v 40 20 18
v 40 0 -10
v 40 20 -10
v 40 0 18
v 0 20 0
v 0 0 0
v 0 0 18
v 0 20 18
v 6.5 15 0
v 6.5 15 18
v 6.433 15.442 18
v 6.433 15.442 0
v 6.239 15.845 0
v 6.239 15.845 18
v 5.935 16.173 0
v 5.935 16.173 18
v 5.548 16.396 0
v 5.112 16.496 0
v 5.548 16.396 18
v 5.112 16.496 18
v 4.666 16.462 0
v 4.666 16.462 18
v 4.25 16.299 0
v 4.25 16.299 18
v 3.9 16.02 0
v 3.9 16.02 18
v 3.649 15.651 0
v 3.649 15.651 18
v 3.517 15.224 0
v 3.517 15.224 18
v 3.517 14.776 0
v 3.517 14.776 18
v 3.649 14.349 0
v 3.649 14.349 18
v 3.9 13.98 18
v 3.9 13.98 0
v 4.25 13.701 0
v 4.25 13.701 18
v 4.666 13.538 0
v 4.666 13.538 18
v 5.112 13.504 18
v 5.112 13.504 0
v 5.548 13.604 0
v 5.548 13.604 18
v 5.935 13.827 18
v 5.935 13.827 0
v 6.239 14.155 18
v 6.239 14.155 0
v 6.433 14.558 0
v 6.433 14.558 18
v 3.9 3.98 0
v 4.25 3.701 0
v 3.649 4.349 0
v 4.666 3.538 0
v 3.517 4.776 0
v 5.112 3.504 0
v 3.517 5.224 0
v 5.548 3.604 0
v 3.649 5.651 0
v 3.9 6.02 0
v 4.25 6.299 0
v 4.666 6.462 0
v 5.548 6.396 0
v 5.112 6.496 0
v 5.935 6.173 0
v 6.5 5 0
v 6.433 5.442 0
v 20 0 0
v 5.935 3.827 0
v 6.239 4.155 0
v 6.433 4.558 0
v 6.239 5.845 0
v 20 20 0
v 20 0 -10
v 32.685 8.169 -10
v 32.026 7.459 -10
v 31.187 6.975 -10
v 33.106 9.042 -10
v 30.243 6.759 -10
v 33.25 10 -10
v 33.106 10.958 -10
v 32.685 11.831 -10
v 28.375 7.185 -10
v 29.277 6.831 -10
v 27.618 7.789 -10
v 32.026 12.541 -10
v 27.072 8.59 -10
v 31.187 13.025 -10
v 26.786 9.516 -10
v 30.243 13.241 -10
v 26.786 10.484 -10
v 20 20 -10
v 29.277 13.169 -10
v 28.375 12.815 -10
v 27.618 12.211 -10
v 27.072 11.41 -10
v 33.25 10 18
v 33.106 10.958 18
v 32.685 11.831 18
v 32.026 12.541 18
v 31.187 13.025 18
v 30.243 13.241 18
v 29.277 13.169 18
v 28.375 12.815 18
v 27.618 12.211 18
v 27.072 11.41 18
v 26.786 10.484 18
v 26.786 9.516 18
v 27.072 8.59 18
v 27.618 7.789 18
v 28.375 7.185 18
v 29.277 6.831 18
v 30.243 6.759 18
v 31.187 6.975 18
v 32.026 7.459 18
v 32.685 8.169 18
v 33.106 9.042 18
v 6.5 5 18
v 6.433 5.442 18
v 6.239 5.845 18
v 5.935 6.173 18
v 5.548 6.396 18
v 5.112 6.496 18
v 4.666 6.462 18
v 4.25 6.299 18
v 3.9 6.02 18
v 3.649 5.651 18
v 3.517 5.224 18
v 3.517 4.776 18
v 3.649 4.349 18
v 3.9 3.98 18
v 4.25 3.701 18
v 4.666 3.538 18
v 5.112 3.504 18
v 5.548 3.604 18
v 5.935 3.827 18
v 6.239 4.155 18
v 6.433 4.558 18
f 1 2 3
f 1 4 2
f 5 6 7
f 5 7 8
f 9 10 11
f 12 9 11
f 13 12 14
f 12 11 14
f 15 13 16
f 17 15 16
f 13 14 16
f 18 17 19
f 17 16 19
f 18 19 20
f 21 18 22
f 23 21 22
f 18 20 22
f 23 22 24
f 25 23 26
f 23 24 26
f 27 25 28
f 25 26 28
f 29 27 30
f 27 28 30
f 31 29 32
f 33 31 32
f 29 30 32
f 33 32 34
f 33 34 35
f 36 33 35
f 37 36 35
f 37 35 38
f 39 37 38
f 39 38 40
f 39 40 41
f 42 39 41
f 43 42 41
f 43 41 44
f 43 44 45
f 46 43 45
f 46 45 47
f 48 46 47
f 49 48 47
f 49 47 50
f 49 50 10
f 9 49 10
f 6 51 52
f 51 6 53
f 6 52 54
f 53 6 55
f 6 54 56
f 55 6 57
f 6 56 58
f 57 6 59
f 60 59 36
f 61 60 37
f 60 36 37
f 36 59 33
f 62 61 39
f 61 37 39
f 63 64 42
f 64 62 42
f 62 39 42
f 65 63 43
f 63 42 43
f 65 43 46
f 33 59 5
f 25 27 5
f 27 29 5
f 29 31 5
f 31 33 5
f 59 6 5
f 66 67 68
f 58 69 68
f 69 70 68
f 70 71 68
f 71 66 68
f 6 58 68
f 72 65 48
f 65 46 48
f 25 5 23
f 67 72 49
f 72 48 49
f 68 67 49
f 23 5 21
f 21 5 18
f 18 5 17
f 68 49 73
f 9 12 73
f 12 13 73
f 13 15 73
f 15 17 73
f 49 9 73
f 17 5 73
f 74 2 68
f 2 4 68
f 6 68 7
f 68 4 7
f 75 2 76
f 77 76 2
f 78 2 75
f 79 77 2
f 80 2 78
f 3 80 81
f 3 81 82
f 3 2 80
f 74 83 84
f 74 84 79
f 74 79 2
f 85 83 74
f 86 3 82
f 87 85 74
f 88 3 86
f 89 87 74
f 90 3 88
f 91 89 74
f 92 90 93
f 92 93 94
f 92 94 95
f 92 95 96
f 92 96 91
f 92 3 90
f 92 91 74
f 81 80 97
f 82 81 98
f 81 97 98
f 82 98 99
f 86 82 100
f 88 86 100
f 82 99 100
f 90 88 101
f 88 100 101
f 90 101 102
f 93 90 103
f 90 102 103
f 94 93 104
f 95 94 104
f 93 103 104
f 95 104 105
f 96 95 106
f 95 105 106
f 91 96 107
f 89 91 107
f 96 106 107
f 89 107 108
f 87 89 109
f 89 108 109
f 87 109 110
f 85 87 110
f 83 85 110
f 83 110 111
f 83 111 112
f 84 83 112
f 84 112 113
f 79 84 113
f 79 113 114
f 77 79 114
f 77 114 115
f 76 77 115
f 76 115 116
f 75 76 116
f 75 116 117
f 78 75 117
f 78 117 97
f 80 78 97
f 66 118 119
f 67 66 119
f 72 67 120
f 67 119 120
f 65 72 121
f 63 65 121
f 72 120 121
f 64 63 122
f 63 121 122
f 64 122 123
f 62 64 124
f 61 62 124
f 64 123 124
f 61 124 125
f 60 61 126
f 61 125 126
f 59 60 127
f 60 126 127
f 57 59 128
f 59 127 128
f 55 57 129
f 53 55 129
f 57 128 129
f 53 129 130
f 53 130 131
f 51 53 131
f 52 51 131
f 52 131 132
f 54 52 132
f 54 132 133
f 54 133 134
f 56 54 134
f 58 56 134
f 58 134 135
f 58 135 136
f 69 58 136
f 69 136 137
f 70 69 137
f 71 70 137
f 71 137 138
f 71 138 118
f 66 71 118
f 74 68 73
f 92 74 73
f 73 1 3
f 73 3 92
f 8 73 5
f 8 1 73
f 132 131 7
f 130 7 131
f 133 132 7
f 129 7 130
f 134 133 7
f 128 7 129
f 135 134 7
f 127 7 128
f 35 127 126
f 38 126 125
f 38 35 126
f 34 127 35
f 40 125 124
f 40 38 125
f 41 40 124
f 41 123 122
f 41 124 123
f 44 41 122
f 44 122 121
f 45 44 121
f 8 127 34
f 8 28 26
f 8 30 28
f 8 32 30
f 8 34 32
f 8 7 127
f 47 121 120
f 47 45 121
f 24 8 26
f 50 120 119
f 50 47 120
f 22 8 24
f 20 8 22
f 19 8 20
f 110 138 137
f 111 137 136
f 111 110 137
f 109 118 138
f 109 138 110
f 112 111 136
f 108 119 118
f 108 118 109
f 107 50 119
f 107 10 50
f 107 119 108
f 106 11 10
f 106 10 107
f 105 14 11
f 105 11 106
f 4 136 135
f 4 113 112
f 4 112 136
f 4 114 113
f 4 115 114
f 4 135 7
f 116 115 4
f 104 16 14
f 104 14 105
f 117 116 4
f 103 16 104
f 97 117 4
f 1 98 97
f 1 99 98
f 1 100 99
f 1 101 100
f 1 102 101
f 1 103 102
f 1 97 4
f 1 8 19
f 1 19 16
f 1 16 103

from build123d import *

# Parameters (mm, degrees)
SKETCH1_W           = 40
SKETCH1_H           = 20
BOSS_EXTRUDE1_DEPTH = 18
SKETCH3_W           = 20
SKETCH3_H           = 20
BOSS_EXTRUDE2_DEPTH = 10
SKETCH2_R           = 3.25
SKETCH2_R_2         = 1.5
CUT_EXTRUDE1_DEPTH  = 65


with BuildPart() as part:
    # Sketch1 → Boss-Extrude1 (new body)
    with BuildSketch(Plane.XY):
        with Locations((20, 10)):
            Rectangle(SKETCH1_W, SKETCH1_H)
    extrude(amount=BOSS_EXTRUDE1_DEPTH)

    # Sketch3 → Boss-Extrude2 (add)
    with BuildSketch(Plane(origin=(0, 0, 0), x_dir=(-1, 0, 0), z_dir=(0, 0, -1))):
        with Locations((-30, 10)):
            Rectangle(SKETCH3_W, SKETCH3_H)
    extrude(amount=BOSS_EXTRUDE2_DEPTH)

    # Sketch2 → Cut-Extrude1 (cut)
    with BuildSketch(Plane.XY.offset(18)):
        with Locations((30, 10)):
            Circle(SKETCH2_R)
        with Locations((5, 15)):
            Circle(SKETCH2_R_2)
        with Locations((5, 5)):
            Circle(SKETCH2_R_2)
    extrude(amount=-CUT_EXTRUDE1_DEPTH, mode=Mode.SUBTRACT)


solid = part.part
